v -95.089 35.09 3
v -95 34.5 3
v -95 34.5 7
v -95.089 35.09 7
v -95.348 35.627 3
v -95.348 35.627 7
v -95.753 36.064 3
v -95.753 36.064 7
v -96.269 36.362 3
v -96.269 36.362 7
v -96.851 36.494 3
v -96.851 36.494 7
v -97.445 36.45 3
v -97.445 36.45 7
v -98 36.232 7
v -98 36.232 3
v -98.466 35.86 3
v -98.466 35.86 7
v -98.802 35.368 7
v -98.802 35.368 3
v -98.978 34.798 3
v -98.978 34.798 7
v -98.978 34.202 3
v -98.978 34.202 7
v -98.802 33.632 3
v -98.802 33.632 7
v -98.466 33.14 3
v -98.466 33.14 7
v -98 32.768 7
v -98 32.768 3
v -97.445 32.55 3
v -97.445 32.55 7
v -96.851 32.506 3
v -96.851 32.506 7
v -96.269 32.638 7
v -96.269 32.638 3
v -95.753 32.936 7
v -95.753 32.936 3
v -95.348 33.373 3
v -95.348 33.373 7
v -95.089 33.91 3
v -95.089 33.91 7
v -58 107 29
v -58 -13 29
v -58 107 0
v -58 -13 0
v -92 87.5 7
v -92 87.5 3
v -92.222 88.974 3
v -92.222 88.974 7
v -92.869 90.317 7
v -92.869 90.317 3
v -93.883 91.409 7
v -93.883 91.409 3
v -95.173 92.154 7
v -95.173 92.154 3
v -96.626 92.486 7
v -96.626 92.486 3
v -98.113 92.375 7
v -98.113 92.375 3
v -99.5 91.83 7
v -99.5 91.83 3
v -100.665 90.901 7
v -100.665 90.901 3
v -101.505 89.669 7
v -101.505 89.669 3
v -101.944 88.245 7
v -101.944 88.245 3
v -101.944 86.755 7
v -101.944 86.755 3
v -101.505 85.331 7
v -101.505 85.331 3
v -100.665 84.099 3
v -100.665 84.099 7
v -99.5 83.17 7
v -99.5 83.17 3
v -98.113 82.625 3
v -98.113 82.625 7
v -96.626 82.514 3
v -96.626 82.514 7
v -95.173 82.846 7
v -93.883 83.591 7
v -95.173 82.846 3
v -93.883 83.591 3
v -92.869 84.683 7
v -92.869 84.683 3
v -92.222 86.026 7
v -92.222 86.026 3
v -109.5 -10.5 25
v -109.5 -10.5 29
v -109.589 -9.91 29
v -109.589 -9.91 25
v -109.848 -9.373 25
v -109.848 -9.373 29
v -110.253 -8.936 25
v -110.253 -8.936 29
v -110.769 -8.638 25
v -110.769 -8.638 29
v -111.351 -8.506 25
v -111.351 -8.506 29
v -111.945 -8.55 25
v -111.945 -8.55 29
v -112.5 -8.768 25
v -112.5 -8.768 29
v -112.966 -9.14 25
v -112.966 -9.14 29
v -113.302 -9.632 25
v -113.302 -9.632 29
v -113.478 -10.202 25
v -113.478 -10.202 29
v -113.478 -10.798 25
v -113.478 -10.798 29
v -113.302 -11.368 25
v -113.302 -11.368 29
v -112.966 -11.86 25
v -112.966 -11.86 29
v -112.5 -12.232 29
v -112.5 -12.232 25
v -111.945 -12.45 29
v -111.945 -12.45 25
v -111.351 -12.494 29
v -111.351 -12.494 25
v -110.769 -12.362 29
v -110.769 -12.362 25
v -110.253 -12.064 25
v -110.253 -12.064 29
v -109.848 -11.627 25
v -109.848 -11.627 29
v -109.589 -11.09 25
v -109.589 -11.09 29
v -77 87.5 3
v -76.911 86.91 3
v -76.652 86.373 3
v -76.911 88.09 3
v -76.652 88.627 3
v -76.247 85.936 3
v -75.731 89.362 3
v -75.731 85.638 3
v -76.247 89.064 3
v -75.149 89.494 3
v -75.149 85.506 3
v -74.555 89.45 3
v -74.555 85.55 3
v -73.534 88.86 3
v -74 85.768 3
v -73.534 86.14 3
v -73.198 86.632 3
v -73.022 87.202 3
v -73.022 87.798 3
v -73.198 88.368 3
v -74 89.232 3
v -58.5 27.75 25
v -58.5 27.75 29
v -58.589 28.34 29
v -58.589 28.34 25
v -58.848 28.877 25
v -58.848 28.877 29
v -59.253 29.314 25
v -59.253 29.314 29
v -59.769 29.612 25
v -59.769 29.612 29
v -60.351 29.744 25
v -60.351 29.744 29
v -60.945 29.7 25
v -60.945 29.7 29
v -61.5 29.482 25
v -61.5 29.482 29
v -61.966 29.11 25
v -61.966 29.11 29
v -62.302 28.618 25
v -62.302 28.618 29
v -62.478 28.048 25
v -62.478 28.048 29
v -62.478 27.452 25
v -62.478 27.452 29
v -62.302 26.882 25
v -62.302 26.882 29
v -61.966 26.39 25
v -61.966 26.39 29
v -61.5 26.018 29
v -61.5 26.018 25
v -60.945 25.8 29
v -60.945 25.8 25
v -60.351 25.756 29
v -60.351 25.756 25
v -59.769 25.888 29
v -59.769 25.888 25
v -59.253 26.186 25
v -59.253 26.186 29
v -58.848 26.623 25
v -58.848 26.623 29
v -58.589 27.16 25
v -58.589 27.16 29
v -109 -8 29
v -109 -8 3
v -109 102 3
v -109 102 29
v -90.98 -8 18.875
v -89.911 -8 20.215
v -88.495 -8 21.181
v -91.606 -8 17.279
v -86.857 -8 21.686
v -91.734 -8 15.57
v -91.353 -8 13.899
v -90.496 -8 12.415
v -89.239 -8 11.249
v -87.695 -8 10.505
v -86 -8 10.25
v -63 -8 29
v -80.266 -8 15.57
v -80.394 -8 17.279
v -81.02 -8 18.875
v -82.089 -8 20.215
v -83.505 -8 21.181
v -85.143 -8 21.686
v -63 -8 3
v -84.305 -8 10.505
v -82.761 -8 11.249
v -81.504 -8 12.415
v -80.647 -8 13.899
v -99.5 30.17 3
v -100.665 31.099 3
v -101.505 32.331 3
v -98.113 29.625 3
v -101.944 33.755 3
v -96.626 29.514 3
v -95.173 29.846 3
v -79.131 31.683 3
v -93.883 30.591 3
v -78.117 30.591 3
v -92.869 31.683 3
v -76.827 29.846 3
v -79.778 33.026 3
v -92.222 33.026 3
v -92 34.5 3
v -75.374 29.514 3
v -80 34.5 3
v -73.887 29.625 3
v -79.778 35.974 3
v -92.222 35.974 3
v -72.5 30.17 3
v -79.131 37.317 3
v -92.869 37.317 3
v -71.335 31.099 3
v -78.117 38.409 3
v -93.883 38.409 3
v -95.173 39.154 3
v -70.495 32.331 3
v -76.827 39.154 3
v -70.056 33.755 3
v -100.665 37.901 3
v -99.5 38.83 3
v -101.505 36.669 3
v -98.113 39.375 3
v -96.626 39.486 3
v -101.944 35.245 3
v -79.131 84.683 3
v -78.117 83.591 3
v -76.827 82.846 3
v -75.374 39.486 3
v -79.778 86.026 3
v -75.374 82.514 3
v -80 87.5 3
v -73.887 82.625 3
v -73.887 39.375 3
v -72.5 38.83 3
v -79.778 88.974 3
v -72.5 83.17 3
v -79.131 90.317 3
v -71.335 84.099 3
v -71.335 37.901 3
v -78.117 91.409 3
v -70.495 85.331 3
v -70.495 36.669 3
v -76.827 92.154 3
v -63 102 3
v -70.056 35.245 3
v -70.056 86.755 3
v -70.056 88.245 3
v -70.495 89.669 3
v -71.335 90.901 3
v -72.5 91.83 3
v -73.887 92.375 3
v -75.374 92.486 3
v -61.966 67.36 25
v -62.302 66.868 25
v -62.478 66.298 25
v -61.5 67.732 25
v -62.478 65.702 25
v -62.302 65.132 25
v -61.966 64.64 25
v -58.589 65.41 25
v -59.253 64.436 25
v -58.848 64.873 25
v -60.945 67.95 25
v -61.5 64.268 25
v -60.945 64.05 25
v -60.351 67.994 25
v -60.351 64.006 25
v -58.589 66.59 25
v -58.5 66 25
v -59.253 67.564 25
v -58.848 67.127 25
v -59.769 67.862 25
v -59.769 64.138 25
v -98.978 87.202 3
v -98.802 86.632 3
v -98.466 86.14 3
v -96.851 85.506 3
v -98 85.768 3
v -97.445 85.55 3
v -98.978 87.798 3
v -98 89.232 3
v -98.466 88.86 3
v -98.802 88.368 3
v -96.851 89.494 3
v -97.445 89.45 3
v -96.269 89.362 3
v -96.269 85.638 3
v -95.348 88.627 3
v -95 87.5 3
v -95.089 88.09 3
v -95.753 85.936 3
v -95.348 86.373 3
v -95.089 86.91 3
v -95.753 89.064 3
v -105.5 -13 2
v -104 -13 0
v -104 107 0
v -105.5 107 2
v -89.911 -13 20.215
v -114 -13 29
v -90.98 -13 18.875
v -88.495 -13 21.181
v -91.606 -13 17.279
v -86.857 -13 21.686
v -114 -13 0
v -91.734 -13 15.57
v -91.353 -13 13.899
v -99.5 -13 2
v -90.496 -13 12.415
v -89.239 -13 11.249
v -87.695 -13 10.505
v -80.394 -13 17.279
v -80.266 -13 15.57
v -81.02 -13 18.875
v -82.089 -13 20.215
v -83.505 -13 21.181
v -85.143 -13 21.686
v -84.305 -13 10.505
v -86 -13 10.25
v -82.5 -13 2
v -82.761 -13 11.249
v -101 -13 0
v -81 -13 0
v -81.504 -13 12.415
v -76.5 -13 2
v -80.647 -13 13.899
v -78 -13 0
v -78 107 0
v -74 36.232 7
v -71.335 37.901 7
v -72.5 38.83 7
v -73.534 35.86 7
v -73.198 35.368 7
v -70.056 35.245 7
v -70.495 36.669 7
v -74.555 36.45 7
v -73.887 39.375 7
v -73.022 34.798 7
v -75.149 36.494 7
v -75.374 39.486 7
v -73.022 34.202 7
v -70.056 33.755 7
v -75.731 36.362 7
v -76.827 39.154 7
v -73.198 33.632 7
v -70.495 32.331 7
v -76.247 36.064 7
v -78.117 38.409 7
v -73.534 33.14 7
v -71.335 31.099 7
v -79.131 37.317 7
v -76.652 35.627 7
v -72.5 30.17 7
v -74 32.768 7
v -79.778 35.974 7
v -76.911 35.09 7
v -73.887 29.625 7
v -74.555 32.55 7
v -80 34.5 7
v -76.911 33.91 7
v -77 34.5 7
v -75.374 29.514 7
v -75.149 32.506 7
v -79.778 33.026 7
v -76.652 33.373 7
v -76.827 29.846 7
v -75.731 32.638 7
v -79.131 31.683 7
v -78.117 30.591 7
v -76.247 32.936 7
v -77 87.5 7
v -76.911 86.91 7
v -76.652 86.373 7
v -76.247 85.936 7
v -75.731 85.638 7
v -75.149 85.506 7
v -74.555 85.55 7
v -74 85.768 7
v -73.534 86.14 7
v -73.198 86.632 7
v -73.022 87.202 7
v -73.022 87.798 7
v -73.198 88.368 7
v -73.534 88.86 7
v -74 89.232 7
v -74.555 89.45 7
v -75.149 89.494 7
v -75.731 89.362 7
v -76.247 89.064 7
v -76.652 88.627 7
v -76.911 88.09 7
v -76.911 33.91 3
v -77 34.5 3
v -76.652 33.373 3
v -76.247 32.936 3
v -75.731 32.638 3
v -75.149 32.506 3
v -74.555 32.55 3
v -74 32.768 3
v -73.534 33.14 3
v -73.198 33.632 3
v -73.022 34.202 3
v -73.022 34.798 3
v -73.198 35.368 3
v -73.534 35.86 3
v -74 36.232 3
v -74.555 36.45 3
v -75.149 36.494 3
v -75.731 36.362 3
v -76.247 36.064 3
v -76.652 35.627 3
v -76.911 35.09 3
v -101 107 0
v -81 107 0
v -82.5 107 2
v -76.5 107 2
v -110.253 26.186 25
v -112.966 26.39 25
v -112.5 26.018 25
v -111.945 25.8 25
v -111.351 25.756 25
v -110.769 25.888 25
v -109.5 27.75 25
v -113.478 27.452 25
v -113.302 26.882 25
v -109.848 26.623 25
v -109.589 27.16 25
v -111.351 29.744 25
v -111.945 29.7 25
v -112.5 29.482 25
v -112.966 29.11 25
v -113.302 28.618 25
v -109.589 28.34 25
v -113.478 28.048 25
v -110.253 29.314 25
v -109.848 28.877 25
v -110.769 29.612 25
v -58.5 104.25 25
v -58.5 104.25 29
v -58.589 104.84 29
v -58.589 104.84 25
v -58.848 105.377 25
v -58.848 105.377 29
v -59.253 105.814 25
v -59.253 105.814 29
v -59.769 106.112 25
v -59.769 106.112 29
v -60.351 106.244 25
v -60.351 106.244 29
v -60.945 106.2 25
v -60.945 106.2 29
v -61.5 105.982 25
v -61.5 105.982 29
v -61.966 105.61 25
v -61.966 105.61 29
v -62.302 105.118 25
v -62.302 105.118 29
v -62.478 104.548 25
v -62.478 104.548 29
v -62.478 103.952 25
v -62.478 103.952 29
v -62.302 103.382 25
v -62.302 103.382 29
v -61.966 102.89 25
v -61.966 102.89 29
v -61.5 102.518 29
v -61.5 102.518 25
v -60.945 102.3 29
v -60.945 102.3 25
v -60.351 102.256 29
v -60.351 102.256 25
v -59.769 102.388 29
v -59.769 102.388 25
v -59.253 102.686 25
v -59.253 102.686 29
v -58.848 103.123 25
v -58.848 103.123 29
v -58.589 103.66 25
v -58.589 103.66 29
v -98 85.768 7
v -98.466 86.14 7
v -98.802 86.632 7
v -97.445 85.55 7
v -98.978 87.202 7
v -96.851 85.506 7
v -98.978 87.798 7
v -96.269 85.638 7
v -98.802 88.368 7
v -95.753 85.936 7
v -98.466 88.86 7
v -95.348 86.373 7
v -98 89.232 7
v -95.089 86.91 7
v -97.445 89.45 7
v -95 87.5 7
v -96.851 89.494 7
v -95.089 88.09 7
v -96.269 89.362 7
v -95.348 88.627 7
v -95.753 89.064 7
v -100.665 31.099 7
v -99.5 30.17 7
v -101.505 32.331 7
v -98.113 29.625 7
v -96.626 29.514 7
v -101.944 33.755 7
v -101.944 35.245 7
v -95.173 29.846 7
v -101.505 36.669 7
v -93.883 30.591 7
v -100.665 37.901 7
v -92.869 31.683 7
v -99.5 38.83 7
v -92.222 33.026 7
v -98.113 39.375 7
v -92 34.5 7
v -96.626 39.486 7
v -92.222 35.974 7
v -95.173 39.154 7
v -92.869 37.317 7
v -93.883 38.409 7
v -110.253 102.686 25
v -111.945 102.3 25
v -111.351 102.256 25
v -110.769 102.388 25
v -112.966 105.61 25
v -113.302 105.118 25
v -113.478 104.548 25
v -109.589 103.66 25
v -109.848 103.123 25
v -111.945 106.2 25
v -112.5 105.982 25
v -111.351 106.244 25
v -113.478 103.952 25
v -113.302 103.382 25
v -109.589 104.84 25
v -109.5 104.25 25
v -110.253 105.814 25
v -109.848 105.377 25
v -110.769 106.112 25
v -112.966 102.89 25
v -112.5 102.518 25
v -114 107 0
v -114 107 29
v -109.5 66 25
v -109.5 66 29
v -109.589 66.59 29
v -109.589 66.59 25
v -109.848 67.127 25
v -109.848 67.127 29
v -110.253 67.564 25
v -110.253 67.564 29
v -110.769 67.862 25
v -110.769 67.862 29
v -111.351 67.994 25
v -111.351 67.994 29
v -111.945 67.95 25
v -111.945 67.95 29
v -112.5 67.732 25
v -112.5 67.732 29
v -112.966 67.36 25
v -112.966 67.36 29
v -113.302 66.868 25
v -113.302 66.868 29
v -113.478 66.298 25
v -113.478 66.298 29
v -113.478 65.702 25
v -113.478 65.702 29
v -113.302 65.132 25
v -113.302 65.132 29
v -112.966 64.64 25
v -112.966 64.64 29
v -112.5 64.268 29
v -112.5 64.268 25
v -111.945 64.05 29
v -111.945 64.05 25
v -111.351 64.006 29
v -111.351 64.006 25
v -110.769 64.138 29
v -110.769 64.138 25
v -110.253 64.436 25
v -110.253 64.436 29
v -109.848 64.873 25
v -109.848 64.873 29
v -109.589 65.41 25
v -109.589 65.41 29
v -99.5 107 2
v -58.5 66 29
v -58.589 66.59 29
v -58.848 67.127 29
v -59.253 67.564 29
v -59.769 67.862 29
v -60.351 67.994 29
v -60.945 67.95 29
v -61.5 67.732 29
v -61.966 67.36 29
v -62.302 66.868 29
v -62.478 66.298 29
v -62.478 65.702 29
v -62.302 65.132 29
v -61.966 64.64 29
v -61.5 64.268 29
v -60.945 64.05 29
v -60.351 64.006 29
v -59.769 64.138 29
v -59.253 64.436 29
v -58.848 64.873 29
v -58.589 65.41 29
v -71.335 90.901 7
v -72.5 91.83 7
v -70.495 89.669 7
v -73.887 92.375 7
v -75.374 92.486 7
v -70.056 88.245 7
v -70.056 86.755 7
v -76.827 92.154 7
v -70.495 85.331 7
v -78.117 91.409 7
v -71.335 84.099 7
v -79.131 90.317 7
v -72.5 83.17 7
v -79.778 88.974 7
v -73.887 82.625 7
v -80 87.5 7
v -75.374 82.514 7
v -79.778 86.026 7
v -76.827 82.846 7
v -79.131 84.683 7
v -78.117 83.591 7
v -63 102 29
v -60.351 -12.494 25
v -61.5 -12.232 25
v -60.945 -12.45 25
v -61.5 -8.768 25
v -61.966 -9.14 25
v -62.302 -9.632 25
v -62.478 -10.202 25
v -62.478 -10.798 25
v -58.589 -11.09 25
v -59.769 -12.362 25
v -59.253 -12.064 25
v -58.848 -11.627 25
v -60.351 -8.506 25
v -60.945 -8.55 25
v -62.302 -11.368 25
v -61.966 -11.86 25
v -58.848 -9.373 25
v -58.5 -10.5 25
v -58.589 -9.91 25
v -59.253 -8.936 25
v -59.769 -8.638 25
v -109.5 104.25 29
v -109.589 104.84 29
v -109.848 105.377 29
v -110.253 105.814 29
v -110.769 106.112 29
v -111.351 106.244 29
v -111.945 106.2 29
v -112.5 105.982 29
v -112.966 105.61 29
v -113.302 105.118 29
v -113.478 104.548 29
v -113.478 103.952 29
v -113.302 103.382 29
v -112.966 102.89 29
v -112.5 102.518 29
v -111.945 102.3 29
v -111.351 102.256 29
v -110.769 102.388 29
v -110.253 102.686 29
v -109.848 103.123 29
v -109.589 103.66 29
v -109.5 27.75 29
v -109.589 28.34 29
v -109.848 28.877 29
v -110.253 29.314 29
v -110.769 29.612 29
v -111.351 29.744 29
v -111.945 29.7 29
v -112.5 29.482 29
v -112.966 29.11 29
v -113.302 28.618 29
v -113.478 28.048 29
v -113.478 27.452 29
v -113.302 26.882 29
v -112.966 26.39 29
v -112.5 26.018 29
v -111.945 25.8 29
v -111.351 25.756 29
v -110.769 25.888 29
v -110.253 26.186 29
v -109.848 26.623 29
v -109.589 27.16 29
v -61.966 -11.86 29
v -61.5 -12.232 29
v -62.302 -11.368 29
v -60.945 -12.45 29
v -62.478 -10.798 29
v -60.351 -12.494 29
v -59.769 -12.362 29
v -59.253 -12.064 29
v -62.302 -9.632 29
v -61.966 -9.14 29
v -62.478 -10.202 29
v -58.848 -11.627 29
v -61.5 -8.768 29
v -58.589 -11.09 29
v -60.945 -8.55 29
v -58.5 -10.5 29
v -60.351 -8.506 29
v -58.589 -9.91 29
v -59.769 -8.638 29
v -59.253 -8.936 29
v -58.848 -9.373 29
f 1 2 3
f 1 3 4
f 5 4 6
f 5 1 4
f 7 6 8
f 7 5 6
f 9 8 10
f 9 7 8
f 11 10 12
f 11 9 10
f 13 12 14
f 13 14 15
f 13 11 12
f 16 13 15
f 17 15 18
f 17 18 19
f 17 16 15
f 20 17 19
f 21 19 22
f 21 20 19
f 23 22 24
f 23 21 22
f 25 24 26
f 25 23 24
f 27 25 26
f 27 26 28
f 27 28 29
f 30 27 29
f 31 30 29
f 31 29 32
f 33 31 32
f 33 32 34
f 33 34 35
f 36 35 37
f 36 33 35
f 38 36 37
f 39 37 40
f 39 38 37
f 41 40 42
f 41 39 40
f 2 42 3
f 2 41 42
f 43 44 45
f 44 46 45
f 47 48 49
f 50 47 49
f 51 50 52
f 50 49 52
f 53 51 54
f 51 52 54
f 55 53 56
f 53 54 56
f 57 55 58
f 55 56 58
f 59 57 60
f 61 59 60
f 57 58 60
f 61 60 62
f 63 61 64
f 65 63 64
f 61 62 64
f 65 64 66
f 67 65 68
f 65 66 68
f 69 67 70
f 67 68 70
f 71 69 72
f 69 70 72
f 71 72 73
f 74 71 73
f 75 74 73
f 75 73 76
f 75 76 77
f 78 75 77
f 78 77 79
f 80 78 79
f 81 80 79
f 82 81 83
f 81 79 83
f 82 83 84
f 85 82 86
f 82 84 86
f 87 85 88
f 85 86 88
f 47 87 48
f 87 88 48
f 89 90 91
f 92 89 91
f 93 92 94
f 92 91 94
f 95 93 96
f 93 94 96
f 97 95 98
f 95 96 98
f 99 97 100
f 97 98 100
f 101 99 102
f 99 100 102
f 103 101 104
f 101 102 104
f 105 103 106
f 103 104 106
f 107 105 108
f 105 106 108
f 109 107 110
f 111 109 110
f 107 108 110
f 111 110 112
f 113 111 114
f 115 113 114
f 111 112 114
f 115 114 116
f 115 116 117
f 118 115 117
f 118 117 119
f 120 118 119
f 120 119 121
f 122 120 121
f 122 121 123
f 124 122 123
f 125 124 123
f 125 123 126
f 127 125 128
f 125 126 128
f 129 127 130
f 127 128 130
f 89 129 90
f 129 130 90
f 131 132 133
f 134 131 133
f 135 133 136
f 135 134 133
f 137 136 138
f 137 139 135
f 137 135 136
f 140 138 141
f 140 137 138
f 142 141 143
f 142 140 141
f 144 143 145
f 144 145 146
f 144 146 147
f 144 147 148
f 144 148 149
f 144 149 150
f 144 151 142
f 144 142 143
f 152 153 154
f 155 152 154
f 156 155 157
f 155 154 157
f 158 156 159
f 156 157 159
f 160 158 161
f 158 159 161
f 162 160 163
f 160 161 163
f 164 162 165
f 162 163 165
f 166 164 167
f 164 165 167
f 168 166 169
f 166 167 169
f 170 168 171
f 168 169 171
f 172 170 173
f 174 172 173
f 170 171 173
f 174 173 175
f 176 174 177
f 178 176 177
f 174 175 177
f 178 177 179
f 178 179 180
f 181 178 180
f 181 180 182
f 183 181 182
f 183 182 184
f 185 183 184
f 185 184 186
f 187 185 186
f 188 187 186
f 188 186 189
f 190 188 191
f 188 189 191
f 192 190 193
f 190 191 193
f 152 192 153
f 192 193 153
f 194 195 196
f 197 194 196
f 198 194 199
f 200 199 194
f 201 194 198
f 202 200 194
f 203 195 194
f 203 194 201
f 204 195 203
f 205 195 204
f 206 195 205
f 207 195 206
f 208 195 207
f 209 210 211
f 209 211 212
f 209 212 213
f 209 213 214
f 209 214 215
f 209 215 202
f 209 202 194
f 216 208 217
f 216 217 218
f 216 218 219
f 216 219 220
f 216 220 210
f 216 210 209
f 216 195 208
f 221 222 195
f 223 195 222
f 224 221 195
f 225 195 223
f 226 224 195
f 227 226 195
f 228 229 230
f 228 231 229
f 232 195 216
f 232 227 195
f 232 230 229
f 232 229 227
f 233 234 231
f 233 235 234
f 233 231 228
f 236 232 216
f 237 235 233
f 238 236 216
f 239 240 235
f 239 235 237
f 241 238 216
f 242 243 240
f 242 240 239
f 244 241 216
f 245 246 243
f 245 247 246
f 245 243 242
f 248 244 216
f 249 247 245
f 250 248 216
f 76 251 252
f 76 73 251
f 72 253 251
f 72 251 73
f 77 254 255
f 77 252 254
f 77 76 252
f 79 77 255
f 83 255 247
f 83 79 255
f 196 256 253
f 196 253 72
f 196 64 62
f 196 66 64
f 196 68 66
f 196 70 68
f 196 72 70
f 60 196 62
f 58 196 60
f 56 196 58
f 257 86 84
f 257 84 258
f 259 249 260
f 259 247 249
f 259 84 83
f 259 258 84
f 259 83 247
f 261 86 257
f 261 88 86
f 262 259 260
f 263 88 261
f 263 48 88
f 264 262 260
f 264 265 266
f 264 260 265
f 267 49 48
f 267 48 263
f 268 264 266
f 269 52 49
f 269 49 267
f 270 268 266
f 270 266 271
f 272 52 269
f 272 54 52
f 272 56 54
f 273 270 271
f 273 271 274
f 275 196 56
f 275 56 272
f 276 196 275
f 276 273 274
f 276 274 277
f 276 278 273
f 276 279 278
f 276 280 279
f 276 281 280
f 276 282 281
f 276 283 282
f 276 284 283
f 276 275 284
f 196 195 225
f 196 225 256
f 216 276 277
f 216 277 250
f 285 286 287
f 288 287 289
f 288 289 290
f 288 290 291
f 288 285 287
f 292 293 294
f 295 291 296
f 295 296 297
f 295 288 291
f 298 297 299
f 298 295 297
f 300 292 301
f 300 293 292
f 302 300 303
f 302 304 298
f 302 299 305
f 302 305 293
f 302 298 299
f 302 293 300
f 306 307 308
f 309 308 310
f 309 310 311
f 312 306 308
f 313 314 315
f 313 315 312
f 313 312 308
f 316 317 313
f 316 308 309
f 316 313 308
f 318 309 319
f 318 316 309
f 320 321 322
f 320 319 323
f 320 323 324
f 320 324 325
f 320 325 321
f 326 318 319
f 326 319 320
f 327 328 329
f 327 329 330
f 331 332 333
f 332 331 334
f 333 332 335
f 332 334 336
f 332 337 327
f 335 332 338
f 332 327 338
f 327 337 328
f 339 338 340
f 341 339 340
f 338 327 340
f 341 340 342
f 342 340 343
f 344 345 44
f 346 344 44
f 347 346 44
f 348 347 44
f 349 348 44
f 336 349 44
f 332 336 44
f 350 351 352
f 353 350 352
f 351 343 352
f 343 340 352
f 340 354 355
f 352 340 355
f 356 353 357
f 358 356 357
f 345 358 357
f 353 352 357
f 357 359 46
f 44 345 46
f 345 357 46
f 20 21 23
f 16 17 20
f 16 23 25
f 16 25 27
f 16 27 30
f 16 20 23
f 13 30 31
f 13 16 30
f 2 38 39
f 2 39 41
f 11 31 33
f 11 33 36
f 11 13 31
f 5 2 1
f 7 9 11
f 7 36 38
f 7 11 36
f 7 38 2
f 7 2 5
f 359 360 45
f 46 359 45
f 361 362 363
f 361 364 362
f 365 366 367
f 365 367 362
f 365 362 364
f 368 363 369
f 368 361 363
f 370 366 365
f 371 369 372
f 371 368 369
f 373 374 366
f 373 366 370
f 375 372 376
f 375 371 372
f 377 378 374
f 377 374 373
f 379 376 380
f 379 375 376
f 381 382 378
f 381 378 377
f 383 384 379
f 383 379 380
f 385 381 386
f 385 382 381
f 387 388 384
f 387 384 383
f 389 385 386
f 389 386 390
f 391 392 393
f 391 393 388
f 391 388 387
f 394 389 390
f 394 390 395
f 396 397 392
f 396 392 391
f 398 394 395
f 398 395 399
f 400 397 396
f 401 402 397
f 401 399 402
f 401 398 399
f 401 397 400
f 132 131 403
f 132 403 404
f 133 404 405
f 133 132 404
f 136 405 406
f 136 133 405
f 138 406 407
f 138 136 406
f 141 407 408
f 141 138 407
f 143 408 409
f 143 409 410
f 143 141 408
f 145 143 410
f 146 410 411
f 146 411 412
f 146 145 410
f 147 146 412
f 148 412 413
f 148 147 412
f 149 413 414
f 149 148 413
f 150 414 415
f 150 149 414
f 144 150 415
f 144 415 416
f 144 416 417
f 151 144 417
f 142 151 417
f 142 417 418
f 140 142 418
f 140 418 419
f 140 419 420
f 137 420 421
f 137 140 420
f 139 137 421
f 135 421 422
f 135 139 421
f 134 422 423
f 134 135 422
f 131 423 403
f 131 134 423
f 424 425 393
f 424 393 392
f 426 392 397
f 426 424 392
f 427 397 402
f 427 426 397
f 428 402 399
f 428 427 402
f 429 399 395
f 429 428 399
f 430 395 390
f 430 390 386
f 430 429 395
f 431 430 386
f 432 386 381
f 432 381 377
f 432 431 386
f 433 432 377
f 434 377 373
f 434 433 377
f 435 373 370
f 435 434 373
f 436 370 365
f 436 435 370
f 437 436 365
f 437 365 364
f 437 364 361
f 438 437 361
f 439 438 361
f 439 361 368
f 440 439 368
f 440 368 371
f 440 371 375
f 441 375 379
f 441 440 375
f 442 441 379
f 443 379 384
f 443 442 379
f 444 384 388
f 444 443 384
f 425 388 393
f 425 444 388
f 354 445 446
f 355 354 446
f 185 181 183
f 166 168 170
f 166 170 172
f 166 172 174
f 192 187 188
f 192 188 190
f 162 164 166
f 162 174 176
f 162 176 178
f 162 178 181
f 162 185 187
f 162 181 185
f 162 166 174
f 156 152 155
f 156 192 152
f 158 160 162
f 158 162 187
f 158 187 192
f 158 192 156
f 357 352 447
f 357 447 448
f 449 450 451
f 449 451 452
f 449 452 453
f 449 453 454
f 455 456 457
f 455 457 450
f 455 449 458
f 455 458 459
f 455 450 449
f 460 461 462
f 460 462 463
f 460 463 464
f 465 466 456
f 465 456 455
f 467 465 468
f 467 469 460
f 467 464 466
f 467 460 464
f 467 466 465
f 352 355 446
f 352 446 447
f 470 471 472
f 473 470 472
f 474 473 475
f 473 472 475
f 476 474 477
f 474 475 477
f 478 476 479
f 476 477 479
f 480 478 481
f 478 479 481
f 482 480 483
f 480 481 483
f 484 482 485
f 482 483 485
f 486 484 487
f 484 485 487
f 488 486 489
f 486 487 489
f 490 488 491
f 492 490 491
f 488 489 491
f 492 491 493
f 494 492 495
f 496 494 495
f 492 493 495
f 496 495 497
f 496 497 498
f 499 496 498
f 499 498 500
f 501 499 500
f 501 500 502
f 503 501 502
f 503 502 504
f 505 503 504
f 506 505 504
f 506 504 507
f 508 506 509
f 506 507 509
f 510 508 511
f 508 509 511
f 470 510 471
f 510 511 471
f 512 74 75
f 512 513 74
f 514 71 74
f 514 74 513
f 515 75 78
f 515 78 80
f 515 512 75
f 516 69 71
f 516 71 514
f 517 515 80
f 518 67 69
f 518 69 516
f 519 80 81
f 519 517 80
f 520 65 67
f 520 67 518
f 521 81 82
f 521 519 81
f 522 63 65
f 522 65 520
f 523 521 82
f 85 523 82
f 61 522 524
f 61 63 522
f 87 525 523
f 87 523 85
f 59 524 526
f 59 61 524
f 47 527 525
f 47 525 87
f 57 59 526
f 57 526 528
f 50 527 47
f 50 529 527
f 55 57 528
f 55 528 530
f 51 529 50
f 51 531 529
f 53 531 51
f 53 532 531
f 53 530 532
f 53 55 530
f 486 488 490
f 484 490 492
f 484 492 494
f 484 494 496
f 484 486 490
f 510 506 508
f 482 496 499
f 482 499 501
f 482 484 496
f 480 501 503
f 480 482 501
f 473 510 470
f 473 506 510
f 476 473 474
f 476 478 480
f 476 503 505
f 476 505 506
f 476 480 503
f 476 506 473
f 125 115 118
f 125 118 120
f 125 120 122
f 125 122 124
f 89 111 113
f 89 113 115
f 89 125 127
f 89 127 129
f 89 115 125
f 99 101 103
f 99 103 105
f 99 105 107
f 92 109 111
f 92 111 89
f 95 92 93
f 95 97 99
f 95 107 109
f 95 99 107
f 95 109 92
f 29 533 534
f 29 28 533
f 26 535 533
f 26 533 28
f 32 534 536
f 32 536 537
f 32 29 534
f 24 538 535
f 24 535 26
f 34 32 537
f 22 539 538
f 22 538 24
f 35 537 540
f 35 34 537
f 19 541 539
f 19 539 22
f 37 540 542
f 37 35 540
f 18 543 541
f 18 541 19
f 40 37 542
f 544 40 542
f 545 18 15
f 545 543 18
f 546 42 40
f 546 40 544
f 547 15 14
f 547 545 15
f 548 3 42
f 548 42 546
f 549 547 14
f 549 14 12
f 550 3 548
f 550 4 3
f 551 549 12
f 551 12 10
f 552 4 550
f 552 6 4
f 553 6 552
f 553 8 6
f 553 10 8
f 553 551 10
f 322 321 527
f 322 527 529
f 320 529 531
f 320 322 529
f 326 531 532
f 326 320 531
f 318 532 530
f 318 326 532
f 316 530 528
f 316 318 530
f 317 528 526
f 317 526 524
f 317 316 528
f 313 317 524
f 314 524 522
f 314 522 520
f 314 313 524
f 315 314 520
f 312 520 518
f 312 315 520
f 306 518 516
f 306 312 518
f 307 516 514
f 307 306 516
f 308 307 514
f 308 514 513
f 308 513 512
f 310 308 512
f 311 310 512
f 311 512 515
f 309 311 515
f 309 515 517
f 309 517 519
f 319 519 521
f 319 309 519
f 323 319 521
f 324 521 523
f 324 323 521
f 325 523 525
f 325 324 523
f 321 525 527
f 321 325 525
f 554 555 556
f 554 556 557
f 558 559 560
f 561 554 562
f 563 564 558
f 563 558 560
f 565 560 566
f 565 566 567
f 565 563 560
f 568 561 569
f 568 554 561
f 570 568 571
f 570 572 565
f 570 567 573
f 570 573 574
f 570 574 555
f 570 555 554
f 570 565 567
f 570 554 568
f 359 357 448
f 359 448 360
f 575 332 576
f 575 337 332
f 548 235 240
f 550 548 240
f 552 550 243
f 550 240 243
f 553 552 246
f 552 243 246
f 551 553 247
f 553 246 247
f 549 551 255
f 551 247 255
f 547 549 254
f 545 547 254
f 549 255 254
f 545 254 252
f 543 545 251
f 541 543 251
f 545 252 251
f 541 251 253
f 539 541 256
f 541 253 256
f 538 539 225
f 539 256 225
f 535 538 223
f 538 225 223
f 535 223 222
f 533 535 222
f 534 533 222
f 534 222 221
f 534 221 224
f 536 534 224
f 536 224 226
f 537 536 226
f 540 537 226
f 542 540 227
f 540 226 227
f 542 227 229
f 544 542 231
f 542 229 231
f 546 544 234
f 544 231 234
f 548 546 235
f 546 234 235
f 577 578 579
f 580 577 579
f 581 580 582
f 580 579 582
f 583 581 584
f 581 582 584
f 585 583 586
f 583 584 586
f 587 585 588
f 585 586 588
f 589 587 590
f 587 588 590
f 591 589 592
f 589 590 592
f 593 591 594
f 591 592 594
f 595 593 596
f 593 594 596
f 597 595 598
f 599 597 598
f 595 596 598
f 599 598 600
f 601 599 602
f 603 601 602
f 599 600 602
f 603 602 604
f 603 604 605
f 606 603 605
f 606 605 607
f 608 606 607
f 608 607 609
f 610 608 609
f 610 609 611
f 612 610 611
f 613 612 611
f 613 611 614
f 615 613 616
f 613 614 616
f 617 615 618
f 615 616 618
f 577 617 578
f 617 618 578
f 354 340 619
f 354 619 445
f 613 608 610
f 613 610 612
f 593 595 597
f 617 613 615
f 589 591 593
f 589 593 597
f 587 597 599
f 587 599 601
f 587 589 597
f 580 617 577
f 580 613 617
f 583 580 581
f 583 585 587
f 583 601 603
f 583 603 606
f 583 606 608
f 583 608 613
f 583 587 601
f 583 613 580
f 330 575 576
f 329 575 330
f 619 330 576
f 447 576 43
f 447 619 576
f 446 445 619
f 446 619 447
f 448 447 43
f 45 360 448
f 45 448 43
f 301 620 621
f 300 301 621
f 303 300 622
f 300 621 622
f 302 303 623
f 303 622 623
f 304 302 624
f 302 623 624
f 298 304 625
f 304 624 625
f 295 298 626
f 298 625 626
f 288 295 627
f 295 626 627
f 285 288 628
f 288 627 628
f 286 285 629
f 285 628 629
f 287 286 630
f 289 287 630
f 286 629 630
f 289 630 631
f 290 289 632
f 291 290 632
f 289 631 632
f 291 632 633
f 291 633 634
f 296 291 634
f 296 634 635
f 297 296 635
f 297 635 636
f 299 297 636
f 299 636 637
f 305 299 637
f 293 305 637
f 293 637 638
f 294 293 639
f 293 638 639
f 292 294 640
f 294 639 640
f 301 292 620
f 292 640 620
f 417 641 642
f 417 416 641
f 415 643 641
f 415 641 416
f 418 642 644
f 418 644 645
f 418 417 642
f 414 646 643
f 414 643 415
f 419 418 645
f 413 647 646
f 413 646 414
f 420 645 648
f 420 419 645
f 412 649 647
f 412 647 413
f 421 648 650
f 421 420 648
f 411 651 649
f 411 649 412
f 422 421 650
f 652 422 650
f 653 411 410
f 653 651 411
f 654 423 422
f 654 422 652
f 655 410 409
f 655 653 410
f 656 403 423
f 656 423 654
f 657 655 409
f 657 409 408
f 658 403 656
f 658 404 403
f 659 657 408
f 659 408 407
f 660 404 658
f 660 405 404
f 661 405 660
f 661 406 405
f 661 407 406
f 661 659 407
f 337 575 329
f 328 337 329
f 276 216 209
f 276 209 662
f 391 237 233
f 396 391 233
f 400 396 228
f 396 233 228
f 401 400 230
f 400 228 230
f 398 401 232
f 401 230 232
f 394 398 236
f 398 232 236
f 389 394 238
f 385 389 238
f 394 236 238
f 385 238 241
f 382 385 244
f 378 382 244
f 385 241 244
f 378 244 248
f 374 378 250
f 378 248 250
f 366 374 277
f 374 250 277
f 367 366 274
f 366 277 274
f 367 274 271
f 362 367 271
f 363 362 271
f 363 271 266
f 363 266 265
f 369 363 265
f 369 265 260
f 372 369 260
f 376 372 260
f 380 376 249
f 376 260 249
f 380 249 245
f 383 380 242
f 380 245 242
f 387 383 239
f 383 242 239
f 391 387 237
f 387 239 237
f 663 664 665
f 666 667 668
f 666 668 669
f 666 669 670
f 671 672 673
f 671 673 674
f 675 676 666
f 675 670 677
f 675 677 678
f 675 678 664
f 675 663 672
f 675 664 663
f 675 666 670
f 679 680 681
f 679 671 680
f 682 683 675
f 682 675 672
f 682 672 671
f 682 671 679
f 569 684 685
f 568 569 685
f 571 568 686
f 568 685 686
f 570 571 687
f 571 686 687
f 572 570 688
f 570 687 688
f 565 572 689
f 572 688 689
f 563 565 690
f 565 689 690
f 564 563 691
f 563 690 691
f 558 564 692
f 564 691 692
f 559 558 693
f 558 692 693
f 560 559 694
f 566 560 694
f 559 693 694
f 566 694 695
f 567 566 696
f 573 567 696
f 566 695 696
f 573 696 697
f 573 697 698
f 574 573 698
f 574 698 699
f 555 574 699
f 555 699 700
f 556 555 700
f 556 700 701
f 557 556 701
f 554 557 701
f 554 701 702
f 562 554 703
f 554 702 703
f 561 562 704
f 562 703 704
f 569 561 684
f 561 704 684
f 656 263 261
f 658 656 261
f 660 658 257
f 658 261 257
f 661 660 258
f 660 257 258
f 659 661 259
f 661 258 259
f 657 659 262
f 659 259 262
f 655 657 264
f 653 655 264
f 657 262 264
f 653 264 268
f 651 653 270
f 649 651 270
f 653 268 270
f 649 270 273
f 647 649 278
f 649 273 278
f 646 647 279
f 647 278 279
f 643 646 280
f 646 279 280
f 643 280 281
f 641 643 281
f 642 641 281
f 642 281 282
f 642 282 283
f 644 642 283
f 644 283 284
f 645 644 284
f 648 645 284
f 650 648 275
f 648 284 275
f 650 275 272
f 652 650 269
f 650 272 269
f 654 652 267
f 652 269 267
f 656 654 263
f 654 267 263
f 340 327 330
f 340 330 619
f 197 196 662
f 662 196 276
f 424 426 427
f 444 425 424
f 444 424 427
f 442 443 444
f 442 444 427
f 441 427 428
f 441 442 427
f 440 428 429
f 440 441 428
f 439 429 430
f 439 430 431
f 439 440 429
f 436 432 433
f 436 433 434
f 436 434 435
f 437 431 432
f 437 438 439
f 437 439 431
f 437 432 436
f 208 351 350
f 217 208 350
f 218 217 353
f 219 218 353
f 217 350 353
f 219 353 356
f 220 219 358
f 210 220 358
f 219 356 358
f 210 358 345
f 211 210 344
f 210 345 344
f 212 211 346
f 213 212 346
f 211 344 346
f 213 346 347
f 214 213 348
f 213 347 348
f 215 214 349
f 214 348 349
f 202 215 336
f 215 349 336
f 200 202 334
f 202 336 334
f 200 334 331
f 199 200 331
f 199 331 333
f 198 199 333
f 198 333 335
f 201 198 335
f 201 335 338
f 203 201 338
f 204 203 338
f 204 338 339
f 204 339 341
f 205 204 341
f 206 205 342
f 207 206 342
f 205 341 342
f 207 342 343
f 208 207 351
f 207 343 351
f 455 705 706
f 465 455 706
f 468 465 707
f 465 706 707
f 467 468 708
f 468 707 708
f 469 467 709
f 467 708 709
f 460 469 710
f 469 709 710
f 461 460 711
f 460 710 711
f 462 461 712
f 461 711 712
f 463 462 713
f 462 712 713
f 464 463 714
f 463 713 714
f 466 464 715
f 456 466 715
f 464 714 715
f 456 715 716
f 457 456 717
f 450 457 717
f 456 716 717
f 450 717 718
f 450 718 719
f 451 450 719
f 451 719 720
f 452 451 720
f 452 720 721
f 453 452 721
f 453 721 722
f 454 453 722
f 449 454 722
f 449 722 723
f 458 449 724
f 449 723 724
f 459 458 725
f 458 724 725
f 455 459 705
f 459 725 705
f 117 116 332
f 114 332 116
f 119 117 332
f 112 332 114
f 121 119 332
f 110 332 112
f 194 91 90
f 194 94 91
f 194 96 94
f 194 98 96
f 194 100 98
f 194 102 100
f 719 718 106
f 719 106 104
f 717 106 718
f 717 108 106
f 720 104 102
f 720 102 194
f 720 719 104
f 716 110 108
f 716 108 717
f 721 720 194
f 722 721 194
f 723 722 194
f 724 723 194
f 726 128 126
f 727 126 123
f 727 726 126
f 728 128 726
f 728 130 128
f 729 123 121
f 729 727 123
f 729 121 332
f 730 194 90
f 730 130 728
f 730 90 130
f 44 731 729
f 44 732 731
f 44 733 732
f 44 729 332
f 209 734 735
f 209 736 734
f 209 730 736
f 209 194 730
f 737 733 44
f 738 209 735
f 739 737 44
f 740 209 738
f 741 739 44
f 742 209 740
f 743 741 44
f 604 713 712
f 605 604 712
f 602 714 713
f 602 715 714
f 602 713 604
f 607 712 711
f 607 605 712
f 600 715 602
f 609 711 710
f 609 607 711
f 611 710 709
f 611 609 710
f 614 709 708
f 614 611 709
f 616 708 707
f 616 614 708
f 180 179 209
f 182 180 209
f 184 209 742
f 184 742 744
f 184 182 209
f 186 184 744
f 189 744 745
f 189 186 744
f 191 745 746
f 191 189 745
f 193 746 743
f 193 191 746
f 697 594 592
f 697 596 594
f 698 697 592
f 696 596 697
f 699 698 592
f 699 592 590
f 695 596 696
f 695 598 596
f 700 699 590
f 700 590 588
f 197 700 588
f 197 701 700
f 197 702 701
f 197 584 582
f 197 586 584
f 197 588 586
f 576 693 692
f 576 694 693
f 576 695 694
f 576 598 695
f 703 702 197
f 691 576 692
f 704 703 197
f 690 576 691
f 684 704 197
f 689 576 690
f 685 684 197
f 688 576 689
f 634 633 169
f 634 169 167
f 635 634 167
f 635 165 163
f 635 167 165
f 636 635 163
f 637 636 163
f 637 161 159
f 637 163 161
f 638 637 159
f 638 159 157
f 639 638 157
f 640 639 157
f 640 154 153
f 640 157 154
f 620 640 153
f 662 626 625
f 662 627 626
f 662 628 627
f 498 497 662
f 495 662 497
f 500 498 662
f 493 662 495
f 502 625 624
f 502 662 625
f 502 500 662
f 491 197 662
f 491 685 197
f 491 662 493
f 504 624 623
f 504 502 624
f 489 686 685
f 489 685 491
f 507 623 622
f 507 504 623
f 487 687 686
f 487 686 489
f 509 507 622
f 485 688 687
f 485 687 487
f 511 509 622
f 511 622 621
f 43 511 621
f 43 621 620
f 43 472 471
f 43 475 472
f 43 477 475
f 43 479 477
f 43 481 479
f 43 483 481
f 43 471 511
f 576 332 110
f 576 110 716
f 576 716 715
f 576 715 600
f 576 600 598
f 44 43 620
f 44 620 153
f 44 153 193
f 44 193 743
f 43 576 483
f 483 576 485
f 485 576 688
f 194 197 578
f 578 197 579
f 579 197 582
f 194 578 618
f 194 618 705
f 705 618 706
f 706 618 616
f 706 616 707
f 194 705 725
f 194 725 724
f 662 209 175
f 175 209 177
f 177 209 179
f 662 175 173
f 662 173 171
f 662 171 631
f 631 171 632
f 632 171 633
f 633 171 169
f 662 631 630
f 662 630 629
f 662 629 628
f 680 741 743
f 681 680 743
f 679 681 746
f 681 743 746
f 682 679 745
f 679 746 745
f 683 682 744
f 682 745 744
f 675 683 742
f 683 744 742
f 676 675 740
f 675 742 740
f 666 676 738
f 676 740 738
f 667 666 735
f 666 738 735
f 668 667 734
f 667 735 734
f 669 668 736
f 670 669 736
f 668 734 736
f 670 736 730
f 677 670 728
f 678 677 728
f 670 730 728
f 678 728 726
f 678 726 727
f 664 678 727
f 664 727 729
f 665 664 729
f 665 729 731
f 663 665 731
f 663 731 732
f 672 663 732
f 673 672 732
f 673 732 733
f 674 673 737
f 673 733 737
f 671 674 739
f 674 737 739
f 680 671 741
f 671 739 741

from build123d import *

# Parameters (mm, degrees)
SKICA1_W                      = 56
SKICA1_H                      = 120
P_IDAT_VYSUNUT_M1_DEPTH       = 3
SKICA2_W                      = 56
SKICA2_H                      = 120
SKICA2_W_2                    = 46
SKICA2_H_2                    = 110
P_IDAT_VYSUNUT_M2_DEPTH       = 26
SKICA3_R                      = 5.75
ODEBRAT_VYSUNUT_M1_DEPTH      = 5
SKICA4_R                      = 5
SKICA4_R_2                    = 2
P_IDAT_VYSUNUT_M3_DEPTH       = 4
SKICA5_R                      = 2
ODEBRAT_VYSUNUT_M2_DEPTH      = 4
ODEBRAT_VYSUNUT_M3_DEPTH      = 169.038686022
ODEBRAT_VYSUNUT_M3_DEPTH_BACK = 169.038686022


with BuildPart() as part:
    # Skica1 → Přidat vysunutím1 (new body)
    with BuildSketch(Plane.XY):
        with Locations((-86, 47)):
            Rectangle(SKICA1_W, SKICA1_H)
    extrude(amount=P_IDAT_VYSUNUT_M1_DEPTH)



with BuildPart() as body_2:
    # Skica2 → Přidat vysunutím2 (new body)
    with BuildSketch(Plane.XY.offset(3)):
        with Locations((-86, 47)):
            Rectangle(SKICA2_W, SKICA2_H)
        with Locations((-86, 47)):
            Rectangle(SKICA2_W_2, SKICA2_H_2, mode=Mode.SUBTRACT)
    extrude(amount=P_IDAT_VYSUNUT_M2_DEPTH)

    # Skica3 → Odebrat vysunutím1 (cut)
    with BuildSketch(Plane.XZ.offset(13)):
        with Locations(Location((-86, 16, 0), (0, 0, 270))):
            Circle(SKICA3_R)
    extrude(amount=-ODEBRAT_VYSUNUT_M1_DEPTH, mode=Mode.SUBTRACT)


with BuildPart() as part_1:
    add(part.part)

    add(body_2.part)  # Přidat vysunutím3 merges body 2
    # Skica4 → Přidat vysunutím3 (add)
    # profile 1 of 4: a face of its own
    with BuildSketch(Plane.XY.offset(3)):
        with Locations((-97, 87.5)):
            Circle(SKICA4_R)
        with Locations((-97, 87.5)):
            Circle(SKICA4_R_2, mode=Mode.SUBTRACT)
    # profile 2 of 4: a face of its own
    with BuildSketch(Plane.XY.offset(3)):
        with Locations((-97, 34.5)):
            Circle(SKICA4_R)
        with Locations((-97, 34.5)):
            Circle(SKICA4_R_2, mode=Mode.SUBTRACT)
    # profile 3 of 4: a face of its own
    with BuildSketch(Plane.XY.offset(3)):
        with Locations(Location((-75, 34.5, 0), (0, 0, 180))):
            Circle(SKICA4_R)
        with Locations(Location((-75, 34.5, 0), (0, 0, 180))):
            Circle(SKICA4_R_2, mode=Mode.SUBTRACT)
    # profile 4 of 4: a face of its own
    with BuildSketch(Plane.XY.offset(3)):
        with Locations(Location((-75, 87.5, 0), (0, 0, 180))):
            Circle(SKICA4_R)
        with Locations(Location((-75, 87.5, 0), (0, 0, 180))):
            Circle(SKICA4_R_2, mode=Mode.SUBTRACT)
    extrude(amount=P_IDAT_VYSUNUT_M3_DEPTH)

    # Skica5 → Odebrat vysunutím2 (cut)
    with BuildSketch(Plane.XY.offset(29)):
        with Locations((-111.5, -10.5)):
            Circle(SKICA5_R)
        with Locations((-60.5, -10.5)):
            Circle(SKICA5_R)
        with Locations((-60.5, 27.75)):
            Circle(SKICA5_R)
        with Locations((-60.5, 66)):
            Circle(SKICA5_R)
        with Locations((-60.5, 104.25)):
            Circle(SKICA5_R)
        with Locations((-111.5, 27.75)):
            Circle(SKICA5_R)
        with Locations((-111.5, 66)):
            Circle(SKICA5_R)
        with Locations((-111.5, 104.25)):
            Circle(SKICA5_R)
    extrude(amount=-ODEBRAT_VYSUNUT_M2_DEPTH, mode=Mode.SUBTRACT)

    # Skica6 → Odebrat vysunutím3 (cut, two sides: drawn at the far end of the back side and taken through both)
    with BuildSketch(Plane(origin=(0, 107, 0), x_dir=(1, 0, 0), z_dir=(0, 1, 0)).offset(-ODEBRAT_VYSUNUT_M3_DEPTH_BACK)):
        Polygon((-104, 0), (-105.5, -2), (-99.5, -2), (-101, 0), align=None)
        Polygon((-81, 0), (-82.5, -2), (-76.5, -2), (-78, 0), align=None)
    extrude(amount=ODEBRAT_VYSUNUT_M3_DEPTH + ODEBRAT_VYSUNUT_M3_DEPTH_BACK, mode=Mode.SUBTRACT)


solid = part_1.part
